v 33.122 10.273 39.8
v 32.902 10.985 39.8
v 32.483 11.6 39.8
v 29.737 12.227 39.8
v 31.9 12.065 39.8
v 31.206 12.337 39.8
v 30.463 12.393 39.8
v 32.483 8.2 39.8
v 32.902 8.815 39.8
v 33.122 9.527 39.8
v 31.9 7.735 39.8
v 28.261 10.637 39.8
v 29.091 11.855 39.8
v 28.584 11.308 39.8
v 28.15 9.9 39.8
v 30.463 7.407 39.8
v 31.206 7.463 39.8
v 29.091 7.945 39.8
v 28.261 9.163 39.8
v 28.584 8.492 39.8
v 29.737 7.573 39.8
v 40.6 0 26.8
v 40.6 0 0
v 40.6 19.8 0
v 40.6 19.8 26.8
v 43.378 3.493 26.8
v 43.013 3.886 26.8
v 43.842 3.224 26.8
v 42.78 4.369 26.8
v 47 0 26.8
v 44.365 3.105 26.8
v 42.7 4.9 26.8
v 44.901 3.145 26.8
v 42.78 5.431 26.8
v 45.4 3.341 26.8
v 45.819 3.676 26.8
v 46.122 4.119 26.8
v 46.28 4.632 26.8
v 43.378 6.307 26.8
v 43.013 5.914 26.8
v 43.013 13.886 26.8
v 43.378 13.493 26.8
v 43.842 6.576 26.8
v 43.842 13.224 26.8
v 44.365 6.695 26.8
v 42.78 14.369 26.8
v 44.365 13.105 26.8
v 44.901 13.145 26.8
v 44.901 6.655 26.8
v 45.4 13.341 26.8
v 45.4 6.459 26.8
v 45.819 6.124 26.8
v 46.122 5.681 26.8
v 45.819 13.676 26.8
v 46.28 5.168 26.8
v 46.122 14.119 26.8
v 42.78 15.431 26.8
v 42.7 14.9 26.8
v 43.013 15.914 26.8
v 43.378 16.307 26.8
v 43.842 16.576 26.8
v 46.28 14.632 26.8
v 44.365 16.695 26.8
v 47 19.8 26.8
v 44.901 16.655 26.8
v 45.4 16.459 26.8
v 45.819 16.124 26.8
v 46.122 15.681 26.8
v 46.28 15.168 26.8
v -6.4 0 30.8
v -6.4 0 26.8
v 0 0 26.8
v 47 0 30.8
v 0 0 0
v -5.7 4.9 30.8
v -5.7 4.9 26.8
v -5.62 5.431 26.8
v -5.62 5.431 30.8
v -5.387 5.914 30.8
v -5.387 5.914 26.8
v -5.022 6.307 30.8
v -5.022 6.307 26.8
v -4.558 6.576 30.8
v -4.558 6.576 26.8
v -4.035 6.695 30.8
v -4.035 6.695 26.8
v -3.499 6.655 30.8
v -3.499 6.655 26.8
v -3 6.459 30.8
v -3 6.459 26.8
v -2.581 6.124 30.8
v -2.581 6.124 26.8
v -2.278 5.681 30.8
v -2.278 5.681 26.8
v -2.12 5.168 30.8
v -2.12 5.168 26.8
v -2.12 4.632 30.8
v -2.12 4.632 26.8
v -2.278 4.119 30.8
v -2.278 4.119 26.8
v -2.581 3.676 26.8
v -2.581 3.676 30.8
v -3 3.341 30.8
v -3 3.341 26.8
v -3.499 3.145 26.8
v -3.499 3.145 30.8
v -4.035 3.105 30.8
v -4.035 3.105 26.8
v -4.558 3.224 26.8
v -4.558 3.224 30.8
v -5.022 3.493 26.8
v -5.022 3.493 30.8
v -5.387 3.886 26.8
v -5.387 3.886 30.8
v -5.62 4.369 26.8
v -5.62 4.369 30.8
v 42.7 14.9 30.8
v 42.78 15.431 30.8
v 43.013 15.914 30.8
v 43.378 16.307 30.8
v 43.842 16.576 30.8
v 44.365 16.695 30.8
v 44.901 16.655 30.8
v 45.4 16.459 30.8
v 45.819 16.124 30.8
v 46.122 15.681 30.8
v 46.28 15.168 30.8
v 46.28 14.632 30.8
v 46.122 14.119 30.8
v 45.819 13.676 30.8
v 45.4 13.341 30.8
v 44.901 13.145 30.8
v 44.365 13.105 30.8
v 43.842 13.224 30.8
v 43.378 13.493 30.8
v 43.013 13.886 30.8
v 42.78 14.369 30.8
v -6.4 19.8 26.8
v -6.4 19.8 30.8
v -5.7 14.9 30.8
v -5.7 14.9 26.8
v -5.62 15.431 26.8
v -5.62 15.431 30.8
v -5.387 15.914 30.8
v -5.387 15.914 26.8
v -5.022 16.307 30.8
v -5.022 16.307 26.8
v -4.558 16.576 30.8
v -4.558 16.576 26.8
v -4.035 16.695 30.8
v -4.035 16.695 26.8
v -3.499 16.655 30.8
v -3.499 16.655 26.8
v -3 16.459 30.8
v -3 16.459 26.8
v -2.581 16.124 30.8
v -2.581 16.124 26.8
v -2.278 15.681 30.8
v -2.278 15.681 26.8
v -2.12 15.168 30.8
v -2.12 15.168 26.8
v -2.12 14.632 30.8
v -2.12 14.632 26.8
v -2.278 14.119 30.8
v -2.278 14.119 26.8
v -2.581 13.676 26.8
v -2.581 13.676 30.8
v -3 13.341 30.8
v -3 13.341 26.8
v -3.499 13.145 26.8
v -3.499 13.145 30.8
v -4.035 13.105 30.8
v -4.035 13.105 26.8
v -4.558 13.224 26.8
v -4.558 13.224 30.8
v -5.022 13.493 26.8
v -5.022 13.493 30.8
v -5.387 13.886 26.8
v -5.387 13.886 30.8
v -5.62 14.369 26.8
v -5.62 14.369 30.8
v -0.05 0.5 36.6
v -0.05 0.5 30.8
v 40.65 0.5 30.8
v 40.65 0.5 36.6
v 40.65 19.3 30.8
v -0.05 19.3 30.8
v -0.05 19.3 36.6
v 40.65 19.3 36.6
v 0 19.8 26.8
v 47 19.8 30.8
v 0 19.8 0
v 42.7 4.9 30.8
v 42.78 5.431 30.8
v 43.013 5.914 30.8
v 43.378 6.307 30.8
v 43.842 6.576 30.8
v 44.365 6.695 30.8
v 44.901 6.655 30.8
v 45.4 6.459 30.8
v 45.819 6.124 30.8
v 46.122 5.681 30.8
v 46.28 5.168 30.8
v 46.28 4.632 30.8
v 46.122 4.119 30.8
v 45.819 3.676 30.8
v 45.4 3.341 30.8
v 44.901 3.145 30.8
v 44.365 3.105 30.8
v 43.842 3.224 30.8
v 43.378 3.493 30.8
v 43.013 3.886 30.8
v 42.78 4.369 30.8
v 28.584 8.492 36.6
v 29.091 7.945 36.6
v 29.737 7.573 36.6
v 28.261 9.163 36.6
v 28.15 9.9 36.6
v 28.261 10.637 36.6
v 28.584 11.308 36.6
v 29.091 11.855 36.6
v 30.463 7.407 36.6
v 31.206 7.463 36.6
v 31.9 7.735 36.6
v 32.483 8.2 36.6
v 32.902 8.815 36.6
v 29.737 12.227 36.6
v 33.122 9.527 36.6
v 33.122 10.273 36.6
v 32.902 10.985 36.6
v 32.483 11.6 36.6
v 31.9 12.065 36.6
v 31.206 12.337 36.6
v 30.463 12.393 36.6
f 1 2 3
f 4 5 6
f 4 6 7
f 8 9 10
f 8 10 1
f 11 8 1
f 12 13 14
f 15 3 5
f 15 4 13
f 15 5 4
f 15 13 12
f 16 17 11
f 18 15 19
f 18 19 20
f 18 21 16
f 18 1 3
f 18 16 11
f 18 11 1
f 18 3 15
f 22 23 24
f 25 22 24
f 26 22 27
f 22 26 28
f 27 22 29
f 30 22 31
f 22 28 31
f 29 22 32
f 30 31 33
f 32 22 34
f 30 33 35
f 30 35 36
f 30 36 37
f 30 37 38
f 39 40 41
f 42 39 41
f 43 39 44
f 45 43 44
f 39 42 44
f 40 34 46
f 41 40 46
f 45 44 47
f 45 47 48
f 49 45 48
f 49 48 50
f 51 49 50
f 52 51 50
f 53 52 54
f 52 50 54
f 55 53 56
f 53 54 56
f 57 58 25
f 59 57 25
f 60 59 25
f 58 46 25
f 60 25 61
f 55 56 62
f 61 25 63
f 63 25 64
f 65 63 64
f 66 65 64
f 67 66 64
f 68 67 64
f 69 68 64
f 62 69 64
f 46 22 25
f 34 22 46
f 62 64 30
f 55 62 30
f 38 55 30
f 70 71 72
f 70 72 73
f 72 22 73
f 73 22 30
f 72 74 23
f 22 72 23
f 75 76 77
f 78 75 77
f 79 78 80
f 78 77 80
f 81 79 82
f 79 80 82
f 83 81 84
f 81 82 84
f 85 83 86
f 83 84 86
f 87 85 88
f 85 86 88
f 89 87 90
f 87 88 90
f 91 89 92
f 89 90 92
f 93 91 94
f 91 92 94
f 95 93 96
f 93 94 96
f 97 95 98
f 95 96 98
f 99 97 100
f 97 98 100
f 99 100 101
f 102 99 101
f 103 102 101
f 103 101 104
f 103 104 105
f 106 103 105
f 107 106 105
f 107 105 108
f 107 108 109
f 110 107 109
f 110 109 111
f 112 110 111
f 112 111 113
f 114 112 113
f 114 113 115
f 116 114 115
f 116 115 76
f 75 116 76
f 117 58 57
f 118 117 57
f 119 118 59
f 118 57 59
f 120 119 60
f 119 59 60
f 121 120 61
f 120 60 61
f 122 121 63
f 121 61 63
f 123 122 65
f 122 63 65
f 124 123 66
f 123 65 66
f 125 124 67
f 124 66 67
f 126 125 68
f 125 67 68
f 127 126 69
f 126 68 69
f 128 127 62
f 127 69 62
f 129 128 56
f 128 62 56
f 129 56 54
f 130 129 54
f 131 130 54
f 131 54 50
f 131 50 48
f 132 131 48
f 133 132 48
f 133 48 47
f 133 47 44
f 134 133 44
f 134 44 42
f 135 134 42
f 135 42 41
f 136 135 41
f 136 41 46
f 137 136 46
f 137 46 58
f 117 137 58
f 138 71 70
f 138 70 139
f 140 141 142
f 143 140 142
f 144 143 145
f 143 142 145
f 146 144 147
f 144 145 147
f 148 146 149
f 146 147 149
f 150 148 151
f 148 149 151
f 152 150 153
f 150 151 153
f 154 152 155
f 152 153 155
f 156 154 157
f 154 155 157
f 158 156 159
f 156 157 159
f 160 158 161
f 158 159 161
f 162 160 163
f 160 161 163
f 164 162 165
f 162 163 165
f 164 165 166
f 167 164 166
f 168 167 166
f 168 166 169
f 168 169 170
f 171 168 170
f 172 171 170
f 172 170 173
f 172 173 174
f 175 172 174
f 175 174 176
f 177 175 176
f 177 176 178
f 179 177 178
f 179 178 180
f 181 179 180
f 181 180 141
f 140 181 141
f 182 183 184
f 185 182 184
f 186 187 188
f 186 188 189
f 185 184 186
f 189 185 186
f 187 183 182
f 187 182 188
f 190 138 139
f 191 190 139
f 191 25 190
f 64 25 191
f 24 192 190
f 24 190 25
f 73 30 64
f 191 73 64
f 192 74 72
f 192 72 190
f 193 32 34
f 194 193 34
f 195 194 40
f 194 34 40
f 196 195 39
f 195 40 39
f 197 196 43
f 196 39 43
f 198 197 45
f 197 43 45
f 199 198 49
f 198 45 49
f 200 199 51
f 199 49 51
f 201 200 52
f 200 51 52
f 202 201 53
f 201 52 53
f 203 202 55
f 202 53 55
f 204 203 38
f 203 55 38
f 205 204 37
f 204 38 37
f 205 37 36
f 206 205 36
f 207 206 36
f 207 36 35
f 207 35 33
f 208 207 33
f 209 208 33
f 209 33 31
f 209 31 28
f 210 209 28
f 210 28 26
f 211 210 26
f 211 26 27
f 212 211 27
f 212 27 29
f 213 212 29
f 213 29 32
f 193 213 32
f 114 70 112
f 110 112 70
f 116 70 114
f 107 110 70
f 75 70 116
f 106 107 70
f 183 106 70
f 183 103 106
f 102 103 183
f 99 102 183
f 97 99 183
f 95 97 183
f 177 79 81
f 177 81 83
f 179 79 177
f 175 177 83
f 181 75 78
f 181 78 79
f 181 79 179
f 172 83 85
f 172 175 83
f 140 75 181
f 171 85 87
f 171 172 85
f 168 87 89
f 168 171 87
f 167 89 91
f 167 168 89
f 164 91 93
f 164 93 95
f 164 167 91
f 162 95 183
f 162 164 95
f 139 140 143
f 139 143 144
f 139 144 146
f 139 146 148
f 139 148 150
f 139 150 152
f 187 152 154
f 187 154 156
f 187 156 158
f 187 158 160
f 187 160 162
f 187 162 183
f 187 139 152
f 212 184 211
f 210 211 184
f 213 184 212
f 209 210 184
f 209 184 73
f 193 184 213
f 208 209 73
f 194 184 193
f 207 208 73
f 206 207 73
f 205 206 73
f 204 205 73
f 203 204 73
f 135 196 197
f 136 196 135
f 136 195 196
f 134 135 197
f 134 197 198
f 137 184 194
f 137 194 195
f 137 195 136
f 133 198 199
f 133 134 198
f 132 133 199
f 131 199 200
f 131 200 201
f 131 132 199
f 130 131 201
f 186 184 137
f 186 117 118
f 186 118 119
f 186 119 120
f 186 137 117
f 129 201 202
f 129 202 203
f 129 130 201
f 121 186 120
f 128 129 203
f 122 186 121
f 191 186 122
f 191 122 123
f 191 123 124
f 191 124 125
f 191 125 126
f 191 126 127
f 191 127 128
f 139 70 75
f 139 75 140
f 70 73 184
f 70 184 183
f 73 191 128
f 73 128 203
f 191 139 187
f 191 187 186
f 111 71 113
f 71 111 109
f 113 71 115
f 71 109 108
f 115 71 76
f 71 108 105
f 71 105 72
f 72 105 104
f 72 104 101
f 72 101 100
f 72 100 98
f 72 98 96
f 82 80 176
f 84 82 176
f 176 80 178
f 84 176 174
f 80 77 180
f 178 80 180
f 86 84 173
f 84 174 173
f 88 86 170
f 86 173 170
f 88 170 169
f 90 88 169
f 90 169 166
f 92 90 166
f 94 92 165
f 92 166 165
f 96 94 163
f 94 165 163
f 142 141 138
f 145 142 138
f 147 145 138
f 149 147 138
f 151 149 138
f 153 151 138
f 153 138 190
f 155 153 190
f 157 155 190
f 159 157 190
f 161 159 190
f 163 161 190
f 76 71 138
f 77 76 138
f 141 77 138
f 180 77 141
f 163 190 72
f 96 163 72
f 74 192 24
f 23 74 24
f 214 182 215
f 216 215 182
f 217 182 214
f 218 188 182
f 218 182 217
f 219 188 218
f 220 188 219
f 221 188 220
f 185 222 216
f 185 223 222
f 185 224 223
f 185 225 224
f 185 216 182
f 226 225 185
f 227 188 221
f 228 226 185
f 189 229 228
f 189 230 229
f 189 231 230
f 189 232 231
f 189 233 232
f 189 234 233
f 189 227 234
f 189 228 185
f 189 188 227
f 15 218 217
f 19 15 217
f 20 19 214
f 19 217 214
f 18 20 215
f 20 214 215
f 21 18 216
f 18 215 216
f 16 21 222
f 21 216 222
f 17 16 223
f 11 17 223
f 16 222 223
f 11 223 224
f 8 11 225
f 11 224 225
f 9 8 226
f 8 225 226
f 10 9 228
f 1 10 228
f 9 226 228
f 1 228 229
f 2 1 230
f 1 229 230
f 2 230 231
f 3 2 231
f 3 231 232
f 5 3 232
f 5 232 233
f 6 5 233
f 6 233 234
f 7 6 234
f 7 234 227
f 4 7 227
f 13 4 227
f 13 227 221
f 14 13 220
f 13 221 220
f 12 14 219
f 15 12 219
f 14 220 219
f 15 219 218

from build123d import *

# Parameters (mm, degrees)
SKETCH1_W            = 40.6
SKETCH1_H            = 19.8
BOSS_EXTRUDE1_DEPTH  = 26.8
SKETCH2_W            = 53.4
SKETCH2_H            = 19.8
BOSS_EXTRUDE2_DEPTH  = 4
M3_CLEARANCE_HOLE1_D = 3.6
SKETCH6_W            = 40.7
SKETCH6_H            = 18.8
BOSS_EXTRUDE3_DEPTH  = 5.8
SKETCH7_R            = 2.5
BOSS_EXTRUDE4_DEPTH  = 3.2


with BuildPart() as part:
    # Sketch1 → Boss-Extrude1 (new body)
    with BuildSketch(Plane.XY):
        with Locations((20.3, 9.9)):
            Rectangle(SKETCH1_W, SKETCH1_H)
    extrude(amount=BOSS_EXTRUDE1_DEPTH)

    # Sketch2 → Boss-Extrude2 (add)
    with BuildSketch(Plane.XY.offset(26.8)):
        with Locations((20.3, 9.9)):
            Rectangle(SKETCH2_W, SKETCH2_H)
    extrude(amount=BOSS_EXTRUDE2_DEPTH)

    # M3 Clearance Hole1 (through all)
    with Locations(Plane.XY.offset(30.8)):
        with Locations((-3.9, 14.9), (-3.9, 4.9), (44.5, 4.9), (44.5, 14.9)):
            Hole(M3_CLEARANCE_HOLE1_D / 2)

    # Sketch6 → Boss-Extrude3 (add)
    with BuildSketch(Plane.XY.offset(30.8)):
        with Locations((20.3, 9.9)):
            Rectangle(SKETCH6_W, SKETCH6_H)
    extrude(amount=BOSS_EXTRUDE3_DEPTH)

    # Sketch7 → Boss-Extrude4 (add)
    with BuildSketch(Plane.XY.offset(36.6)):
        with Locations(Location((30.65, 9.9, 0), (0, 0, 180))):
            Circle(SKETCH7_R)
    extrude(amount=BOSS_EXTRUDE4_DEPTH)


solid = part.part
